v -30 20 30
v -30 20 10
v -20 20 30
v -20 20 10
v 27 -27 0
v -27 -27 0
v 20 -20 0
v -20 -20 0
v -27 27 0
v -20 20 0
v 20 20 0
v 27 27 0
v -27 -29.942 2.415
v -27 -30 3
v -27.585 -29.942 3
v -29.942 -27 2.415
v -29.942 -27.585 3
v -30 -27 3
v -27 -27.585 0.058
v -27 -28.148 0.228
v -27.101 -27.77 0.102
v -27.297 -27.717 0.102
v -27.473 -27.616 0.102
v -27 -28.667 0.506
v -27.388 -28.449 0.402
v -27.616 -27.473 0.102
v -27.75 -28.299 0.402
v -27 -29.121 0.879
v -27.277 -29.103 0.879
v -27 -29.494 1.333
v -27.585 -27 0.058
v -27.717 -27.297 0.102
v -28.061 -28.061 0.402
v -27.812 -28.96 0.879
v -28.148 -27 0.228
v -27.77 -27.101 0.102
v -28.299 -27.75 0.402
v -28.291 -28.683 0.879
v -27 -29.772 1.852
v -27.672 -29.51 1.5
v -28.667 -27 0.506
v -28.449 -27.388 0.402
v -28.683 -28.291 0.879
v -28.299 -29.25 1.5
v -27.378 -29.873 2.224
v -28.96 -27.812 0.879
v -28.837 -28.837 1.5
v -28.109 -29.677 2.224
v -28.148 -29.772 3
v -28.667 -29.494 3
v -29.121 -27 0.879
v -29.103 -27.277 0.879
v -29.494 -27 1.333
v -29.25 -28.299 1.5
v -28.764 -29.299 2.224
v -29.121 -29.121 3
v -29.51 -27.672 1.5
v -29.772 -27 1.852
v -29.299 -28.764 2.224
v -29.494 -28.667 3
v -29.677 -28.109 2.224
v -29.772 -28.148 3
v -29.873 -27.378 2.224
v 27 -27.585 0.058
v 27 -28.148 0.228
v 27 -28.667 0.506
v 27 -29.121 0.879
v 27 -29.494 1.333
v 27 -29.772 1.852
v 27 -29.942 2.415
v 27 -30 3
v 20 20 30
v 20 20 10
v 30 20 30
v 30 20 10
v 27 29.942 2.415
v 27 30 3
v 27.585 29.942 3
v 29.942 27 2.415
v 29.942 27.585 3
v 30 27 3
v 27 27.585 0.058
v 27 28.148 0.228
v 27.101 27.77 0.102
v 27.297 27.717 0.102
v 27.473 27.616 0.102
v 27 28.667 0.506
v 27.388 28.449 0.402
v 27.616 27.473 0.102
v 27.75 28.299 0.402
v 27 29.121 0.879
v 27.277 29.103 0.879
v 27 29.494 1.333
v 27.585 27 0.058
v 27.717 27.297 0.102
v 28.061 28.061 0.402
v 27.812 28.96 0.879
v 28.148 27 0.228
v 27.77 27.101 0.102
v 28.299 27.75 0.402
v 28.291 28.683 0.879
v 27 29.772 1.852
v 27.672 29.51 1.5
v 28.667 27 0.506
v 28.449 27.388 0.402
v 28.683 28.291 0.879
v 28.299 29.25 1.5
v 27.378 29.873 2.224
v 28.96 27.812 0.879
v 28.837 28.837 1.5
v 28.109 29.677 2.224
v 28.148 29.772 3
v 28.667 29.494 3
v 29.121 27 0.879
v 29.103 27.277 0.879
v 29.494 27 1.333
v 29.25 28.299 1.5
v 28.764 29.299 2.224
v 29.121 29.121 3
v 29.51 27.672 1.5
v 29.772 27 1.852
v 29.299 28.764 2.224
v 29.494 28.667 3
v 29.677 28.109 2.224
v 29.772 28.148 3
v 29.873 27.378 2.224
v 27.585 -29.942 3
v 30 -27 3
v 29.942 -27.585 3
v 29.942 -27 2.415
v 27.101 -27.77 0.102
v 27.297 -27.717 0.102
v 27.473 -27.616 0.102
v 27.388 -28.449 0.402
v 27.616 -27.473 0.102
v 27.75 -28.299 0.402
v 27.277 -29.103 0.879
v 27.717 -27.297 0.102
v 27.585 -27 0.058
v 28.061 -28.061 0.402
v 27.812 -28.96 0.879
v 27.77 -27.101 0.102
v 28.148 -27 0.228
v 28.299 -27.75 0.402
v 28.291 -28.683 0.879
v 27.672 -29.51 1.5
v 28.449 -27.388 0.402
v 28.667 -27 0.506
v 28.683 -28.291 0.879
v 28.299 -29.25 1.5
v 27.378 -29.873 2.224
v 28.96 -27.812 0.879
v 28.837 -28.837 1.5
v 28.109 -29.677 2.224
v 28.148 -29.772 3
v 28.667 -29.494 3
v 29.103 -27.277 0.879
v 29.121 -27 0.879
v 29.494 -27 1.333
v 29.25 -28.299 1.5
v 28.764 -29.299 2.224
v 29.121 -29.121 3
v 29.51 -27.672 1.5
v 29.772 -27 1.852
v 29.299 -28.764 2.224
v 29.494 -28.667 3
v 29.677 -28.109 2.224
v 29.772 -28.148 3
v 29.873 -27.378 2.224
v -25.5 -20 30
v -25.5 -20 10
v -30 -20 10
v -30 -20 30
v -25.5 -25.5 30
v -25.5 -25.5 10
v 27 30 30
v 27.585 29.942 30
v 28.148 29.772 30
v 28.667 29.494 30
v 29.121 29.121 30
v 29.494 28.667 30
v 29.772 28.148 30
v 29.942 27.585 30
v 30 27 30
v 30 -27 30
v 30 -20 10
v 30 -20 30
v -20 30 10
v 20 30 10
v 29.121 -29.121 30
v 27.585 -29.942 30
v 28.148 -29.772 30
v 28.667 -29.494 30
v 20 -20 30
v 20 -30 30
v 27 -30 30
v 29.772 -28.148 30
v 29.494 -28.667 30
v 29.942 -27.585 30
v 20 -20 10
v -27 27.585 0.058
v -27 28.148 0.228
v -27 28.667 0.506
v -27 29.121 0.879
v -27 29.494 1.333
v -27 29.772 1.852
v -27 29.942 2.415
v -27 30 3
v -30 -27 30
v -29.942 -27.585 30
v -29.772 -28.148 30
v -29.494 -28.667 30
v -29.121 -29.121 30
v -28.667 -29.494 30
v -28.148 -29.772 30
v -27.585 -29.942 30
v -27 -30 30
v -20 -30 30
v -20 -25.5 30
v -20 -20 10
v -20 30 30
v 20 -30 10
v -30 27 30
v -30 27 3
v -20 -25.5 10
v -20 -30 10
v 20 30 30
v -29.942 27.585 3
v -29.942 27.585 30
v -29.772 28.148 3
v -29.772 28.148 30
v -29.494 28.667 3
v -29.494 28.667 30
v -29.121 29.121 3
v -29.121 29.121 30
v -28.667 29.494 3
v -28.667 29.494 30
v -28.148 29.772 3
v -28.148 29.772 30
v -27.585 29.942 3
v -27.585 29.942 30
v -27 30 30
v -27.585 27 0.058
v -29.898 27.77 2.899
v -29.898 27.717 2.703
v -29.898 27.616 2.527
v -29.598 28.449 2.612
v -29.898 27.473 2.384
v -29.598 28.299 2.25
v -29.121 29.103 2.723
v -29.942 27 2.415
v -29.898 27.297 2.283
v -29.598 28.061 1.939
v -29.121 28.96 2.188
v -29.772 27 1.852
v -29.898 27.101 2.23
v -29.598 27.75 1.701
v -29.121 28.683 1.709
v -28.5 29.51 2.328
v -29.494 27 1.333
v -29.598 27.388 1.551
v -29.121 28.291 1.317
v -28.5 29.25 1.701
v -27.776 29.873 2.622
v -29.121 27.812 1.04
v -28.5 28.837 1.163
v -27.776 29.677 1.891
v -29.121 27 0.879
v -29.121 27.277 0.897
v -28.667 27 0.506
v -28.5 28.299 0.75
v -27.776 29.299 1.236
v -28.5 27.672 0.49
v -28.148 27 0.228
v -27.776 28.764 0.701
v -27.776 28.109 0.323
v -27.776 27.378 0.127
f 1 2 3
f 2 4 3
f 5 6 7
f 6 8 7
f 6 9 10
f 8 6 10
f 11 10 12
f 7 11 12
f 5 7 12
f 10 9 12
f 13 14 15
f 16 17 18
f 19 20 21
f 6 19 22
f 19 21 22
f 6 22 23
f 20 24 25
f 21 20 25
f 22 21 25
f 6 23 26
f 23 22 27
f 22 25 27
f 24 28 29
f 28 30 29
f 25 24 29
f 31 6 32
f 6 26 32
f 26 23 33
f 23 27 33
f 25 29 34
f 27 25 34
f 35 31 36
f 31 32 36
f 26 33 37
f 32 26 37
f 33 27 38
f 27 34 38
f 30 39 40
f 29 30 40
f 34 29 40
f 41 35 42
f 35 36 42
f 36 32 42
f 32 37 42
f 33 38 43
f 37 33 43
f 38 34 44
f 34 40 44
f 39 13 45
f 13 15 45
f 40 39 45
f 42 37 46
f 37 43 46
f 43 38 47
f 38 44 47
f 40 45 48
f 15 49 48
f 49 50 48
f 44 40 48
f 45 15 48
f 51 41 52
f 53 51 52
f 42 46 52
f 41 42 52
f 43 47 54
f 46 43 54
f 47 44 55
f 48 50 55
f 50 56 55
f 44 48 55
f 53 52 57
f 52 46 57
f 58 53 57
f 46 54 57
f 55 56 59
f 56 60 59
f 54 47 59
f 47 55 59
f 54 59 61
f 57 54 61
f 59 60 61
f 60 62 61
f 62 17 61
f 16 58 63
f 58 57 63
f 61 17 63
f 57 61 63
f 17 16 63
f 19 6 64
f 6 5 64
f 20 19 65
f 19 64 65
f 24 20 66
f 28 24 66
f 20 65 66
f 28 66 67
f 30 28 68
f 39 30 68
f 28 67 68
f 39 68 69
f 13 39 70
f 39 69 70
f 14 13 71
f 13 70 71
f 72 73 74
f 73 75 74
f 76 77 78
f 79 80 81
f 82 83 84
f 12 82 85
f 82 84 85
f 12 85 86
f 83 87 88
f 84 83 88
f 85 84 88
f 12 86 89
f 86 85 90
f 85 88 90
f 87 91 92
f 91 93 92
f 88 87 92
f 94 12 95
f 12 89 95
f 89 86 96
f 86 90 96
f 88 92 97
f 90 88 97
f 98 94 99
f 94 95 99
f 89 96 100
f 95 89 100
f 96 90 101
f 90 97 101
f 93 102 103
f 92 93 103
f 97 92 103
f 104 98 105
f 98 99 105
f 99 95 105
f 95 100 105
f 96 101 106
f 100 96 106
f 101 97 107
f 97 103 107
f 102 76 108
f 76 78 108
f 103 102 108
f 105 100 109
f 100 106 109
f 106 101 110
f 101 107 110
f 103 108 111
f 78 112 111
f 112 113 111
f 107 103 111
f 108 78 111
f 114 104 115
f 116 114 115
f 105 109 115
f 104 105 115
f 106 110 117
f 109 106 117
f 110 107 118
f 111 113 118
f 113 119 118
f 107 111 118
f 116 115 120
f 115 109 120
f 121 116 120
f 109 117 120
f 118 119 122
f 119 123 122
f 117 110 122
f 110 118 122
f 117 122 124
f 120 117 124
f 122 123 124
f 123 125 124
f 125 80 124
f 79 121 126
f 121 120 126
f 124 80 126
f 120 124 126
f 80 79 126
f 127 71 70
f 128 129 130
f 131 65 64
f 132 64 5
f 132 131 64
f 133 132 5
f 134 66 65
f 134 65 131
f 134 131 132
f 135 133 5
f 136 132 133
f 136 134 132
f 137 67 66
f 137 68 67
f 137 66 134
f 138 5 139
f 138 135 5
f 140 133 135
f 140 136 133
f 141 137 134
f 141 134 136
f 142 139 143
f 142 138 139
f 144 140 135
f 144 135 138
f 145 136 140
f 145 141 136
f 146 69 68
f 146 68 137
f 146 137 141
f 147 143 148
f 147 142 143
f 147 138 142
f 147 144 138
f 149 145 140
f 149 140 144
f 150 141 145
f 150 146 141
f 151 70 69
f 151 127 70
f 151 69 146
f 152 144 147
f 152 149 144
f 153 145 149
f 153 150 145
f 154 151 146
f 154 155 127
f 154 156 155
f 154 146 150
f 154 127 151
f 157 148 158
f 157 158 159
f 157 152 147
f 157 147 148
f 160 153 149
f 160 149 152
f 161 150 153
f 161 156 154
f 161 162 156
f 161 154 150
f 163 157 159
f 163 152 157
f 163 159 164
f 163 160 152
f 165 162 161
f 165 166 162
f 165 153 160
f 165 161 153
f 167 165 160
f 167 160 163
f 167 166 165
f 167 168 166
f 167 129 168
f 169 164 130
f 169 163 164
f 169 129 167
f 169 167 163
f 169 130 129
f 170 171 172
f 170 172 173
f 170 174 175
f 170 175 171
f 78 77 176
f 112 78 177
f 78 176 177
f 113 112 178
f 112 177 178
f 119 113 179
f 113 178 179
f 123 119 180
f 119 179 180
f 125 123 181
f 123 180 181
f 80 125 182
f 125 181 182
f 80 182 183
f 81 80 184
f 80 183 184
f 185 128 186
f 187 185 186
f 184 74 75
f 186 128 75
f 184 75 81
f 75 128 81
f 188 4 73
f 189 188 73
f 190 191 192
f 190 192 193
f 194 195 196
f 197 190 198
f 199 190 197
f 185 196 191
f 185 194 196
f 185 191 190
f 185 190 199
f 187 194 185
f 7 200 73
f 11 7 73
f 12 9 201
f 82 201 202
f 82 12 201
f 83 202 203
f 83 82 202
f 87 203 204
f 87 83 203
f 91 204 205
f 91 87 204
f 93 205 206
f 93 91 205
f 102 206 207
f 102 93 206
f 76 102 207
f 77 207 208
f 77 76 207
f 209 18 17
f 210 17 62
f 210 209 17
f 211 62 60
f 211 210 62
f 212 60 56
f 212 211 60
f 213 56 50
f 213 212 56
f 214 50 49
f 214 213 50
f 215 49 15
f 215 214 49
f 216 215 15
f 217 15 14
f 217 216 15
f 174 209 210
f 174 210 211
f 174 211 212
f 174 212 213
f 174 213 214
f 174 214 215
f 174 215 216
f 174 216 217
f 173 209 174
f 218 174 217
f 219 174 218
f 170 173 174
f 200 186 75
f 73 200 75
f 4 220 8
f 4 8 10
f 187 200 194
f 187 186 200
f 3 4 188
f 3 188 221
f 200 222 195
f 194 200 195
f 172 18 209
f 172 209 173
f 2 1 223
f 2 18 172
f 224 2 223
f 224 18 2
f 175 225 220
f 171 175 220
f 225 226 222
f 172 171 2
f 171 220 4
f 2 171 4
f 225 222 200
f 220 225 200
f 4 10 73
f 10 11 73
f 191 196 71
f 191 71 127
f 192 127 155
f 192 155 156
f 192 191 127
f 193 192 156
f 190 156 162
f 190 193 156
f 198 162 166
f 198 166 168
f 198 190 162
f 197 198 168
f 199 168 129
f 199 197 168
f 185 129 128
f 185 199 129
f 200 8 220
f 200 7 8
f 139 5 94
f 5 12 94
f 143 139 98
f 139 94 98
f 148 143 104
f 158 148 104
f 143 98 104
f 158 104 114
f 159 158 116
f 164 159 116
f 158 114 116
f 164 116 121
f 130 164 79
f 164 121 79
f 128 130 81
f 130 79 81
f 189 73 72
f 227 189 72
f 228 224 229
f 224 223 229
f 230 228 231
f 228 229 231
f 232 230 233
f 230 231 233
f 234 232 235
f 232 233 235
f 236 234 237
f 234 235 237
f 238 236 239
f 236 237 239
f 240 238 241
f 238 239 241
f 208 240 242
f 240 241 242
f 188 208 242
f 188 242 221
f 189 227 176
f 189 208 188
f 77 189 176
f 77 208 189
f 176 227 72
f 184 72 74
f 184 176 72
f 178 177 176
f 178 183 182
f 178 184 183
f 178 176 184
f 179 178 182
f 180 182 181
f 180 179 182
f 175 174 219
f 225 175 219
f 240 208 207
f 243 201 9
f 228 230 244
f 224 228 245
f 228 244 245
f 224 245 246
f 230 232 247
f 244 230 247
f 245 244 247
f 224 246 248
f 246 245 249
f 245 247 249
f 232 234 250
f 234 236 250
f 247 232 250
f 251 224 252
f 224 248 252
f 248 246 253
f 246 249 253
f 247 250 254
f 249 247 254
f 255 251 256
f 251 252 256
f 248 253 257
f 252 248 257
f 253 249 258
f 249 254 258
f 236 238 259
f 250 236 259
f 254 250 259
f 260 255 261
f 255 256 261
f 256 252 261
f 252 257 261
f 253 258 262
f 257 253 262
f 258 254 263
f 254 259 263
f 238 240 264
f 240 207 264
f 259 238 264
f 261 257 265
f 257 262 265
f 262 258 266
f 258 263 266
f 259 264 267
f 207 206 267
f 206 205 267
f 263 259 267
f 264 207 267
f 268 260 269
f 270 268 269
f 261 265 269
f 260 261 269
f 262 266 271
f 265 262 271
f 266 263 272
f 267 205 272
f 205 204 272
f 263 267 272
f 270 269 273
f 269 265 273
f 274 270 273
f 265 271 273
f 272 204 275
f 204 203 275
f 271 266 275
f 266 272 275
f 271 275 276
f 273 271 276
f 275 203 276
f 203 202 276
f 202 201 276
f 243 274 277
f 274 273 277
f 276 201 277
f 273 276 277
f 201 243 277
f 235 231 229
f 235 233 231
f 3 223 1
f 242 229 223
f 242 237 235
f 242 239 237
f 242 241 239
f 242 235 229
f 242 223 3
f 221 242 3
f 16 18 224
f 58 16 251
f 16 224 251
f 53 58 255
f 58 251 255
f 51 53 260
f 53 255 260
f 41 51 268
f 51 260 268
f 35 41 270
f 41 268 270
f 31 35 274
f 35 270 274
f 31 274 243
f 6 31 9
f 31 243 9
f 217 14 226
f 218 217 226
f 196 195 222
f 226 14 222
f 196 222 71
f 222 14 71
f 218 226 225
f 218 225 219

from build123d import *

# Parameters (mm, degrees)
F0_W     = 60
F0_H     = 60
F1_DEPTH = 30
F2_W     = 40
F2_H     = 40
F3_DEPTH = 30
F4_W     = 40
F4_H     = 20
F5_DEPTH = 60
F6_W     = 40
F6_H     = 20
F7_DEPTH = 60
F8_W     = 5.5
F8_H     = 5.5
F9_DEPTH = 20
F10_R    = 3


with BuildPart() as f1:
    # F0 (on Top) → F1 (new body)
    with BuildSketch(Plane.XY):
        Rectangle(F0_W, F0_H)
    extrude(amount=F1_DEPTH)

    # F2 (on face) → F3 (cut)
    with BuildSketch(Plane.XY.offset(30)):
        Rectangle(F2_W, F2_H)
    extrude(amount=-F3_DEPTH, mode=Mode.SUBTRACT)

    # F4 (on face) → F5 (cut)
    with BuildSketch(Plane.YZ.offset(30)):
        with Locations((0, 20)):
            Rectangle(F4_W, F4_H)
    extrude(amount=-F5_DEPTH, mode=Mode.SUBTRACT)

    # F6 (on face) → F7 (cut)
    with BuildSketch(Plane.XZ.offset(30)):
        with Locations((0, 20)):
            Rectangle(F6_W, F6_H)
    extrude(amount=-F7_DEPTH, mode=Mode.SUBTRACT)

    # F8 (on face) → F9 (cut)
    with BuildSketch(Plane.XY.offset(30)):
        with Locations((-22.75, -22.75)):
            Rectangle(F8_W, F8_H)
    extrude(amount=-F9_DEPTH, mode=Mode.SUBTRACT)

    # F10
    f10_edges = [f1.edges().sort_by_distance(p)[0] for p in [
        (30, 30, 15),
        (0, 30, 0),
        (-30, 30, 15),
        (30, -30, 15),
        (-30, -30, 15),
        (0, -30, 0),
        (-30, 0, 0),
        (30, 0, 0),
    ]]
    fillet(f10_edges, radius=F10_R)


solid = f1.part
